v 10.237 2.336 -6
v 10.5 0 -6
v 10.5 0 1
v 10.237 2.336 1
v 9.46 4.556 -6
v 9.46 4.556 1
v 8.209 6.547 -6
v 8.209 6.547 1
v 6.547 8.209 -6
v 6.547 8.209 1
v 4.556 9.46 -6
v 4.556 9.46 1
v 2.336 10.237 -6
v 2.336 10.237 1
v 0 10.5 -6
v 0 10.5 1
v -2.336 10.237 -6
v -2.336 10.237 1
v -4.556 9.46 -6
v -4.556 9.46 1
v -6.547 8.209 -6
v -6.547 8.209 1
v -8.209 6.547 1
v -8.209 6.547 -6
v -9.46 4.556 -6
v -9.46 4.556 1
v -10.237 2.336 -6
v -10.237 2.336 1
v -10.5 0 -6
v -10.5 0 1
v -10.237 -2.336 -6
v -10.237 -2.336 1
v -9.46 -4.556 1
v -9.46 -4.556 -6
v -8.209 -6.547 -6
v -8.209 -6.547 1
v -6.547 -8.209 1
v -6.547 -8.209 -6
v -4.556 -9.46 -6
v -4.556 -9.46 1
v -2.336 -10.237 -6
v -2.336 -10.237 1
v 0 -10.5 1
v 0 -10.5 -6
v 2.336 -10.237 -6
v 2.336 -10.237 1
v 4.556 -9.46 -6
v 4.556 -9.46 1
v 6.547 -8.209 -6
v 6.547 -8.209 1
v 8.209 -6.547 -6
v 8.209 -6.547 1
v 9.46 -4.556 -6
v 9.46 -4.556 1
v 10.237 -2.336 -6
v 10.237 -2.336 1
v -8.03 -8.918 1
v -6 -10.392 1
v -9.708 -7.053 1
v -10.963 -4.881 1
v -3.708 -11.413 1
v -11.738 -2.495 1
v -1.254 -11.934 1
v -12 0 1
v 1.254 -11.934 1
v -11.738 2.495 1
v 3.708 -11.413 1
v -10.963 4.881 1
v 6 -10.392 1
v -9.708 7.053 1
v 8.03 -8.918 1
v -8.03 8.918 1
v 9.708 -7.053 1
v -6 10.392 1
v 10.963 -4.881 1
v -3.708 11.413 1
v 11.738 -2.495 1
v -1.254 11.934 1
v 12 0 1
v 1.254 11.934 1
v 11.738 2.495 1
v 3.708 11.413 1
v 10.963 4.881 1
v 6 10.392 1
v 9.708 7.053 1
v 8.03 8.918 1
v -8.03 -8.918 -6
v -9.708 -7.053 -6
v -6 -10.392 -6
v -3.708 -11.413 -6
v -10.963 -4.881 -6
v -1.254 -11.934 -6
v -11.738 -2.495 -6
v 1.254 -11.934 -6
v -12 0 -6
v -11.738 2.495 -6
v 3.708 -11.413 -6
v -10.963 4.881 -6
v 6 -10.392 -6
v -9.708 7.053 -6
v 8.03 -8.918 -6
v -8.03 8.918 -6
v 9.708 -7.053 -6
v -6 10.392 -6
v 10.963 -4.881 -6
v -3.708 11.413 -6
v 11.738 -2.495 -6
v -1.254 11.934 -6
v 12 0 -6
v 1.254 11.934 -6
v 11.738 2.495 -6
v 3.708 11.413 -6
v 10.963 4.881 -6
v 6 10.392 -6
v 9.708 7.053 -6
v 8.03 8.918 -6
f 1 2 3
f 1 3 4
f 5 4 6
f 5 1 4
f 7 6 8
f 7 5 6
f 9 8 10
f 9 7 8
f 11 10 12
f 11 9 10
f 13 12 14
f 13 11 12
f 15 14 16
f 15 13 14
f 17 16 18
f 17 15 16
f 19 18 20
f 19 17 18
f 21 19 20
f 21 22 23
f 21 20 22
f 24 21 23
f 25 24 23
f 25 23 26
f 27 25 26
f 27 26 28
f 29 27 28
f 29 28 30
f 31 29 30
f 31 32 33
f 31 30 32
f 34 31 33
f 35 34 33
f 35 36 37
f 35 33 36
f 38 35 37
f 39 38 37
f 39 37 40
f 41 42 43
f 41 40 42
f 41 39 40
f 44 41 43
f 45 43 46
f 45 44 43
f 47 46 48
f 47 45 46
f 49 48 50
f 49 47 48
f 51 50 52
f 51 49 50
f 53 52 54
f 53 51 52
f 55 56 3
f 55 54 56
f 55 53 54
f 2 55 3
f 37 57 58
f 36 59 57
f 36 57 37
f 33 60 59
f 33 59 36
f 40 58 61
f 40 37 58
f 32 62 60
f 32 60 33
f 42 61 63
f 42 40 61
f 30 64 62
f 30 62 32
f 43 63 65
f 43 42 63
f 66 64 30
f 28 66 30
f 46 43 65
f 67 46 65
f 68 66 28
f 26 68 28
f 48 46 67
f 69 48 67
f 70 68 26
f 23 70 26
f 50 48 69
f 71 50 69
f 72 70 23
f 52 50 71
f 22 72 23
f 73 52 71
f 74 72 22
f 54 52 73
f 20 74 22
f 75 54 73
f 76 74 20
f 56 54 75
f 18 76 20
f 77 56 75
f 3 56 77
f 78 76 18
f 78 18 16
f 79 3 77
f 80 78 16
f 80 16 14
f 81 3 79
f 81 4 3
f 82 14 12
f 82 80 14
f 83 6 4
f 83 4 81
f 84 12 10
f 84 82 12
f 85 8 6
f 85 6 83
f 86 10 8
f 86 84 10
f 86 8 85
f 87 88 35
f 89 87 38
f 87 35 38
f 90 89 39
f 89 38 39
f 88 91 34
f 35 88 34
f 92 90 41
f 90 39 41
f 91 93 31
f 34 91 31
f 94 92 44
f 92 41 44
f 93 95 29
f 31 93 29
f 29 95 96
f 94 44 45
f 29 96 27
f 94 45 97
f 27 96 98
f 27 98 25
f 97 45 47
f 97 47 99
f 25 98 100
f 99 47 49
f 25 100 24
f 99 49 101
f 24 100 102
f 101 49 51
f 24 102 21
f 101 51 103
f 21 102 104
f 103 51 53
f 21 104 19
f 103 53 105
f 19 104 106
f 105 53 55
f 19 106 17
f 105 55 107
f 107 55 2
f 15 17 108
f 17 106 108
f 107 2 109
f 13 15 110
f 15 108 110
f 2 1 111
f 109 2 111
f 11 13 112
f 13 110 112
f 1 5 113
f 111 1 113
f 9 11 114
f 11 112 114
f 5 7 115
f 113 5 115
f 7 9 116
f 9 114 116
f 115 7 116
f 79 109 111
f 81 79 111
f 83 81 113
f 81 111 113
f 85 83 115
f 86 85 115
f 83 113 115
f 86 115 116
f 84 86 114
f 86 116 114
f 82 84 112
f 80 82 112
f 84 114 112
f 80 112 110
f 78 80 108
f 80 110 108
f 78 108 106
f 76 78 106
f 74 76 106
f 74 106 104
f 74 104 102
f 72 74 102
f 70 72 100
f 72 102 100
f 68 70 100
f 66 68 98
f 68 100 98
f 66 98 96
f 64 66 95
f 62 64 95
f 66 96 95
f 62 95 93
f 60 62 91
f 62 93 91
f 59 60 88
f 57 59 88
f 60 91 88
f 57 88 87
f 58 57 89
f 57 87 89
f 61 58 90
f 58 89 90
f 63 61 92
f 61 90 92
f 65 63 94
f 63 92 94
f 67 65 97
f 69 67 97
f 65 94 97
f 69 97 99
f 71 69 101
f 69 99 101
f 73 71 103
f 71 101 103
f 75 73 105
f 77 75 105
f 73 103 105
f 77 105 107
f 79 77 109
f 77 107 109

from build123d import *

# Parameters (mm, degrees)
CYLINDER026_R     = 10.5
CYLINDER026_DEPTH = 13
CYLINDER025_R     = 12
CYLINDER025_DEPTH = 7


with BuildPart() as cylinder026:
    # Cylinder026 → Cylinder026 (new body)
    with BuildSketch(Plane.XY.offset(-6)):
        Circle(CYLINDER026_R)
    extrude(amount=CYLINDER026_DEPTH)


with BuildPart() as cut094:
    # Cylinder025 → Cylinder025 (new body)
    with BuildSketch(Plane.XY.offset(-6)):
        Circle(CYLINDER025_R)
    extrude(amount=CYLINDER025_DEPTH)

    # Cut094: cut Cylinder026
    add(cylinder026.part, mode=Mode.SUBTRACT)


solid = cut094.part
